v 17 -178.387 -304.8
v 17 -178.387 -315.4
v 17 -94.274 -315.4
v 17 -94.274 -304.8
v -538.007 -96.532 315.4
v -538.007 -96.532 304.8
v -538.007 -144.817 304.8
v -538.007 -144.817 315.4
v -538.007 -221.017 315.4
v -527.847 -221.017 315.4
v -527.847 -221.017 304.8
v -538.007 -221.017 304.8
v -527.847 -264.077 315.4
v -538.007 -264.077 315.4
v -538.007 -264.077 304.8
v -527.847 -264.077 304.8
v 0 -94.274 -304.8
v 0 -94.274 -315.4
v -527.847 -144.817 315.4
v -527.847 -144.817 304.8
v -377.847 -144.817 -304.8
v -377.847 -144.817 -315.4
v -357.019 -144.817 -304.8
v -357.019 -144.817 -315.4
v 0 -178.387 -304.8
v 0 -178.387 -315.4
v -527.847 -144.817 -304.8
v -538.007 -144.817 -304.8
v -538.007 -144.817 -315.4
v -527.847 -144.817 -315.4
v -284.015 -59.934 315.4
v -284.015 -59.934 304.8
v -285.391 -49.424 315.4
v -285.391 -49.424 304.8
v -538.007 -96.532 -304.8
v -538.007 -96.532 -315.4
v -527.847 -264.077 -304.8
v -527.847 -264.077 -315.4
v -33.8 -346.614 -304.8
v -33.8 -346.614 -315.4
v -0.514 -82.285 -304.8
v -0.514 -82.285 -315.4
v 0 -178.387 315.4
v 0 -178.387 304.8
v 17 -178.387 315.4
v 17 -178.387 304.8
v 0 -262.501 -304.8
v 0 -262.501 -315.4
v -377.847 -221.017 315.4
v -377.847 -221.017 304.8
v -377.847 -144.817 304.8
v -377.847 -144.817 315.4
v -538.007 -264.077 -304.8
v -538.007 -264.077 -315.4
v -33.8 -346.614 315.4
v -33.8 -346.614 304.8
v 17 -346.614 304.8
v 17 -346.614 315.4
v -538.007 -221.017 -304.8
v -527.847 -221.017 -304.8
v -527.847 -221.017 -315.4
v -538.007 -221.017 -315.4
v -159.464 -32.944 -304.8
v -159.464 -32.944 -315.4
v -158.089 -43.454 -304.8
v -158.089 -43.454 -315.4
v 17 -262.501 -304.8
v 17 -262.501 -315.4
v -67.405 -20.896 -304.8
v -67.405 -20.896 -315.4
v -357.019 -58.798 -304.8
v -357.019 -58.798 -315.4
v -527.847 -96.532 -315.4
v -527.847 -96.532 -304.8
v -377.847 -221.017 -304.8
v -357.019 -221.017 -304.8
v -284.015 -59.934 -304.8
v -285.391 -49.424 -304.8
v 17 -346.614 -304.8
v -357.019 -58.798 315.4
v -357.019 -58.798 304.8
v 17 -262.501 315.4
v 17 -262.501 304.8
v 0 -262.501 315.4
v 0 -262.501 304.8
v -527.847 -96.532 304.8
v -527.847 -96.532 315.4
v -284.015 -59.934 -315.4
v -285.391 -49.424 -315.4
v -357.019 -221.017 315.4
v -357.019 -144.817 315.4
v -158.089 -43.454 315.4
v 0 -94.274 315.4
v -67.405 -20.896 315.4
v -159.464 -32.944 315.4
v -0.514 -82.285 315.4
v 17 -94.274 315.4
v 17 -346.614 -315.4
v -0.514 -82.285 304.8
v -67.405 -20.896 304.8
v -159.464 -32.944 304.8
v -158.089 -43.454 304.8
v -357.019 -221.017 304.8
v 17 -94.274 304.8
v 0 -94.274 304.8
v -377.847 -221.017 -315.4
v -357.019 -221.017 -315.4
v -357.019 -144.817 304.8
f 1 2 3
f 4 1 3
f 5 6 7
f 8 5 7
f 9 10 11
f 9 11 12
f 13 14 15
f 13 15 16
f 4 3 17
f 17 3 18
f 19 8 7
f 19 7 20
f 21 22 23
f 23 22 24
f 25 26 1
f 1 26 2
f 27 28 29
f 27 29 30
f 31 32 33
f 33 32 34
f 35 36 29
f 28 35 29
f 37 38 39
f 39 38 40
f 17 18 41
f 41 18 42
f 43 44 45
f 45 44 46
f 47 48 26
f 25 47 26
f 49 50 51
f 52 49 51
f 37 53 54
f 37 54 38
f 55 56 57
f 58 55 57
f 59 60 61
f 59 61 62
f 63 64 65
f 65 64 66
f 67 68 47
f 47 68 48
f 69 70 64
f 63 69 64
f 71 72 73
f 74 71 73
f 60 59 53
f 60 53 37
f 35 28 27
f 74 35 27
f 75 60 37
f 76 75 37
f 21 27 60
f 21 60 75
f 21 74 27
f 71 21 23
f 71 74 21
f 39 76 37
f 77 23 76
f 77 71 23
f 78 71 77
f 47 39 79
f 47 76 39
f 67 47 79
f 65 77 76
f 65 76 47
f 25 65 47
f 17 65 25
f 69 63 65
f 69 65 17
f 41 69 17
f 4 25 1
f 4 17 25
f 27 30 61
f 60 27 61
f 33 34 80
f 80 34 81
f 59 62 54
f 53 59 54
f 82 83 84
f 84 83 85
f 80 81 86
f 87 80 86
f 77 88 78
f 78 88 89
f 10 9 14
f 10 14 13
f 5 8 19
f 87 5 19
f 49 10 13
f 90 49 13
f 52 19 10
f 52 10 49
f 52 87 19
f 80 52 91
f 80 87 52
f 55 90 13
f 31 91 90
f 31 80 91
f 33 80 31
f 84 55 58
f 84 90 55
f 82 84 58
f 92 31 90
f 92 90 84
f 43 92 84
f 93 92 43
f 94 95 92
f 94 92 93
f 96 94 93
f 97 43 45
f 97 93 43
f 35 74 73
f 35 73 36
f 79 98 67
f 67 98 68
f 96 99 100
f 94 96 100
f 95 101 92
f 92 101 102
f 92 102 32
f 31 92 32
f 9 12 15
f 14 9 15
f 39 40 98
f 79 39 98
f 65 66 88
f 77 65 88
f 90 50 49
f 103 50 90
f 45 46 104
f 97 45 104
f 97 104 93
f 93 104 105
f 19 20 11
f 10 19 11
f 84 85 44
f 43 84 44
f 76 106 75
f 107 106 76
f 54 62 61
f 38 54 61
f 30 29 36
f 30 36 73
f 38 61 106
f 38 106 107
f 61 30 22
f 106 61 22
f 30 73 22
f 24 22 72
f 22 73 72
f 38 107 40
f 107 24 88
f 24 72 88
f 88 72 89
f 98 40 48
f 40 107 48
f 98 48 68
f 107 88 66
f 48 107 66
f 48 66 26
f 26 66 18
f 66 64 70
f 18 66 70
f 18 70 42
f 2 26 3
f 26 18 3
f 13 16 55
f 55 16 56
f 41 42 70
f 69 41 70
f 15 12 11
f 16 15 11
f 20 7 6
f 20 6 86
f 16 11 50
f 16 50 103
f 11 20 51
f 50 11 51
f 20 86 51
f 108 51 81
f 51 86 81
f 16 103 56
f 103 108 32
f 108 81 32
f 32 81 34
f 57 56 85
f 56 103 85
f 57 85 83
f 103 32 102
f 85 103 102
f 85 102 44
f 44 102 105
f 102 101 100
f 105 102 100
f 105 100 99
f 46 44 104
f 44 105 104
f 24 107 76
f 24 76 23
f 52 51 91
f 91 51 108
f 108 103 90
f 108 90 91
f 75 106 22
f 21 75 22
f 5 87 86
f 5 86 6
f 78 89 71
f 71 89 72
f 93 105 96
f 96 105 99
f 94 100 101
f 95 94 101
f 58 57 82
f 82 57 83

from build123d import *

# Parameters (mm, degrees)
BOSS_EXTRUDE6_START = 304.8
SKETCH1_W           = 20.828
SKETCH1_H           = 76.2
BOSS_EXTRUDE6_DEPTH = 10.6
BOSS_EXTRUDE7_START = -315.4
SKETCH1_6_W         = 20.828
SKETCH1_6_H         = 76.2
BOSS_EXTRUDE7_DEPTH = 10.6


with BuildPart() as part:
    # Sketch1 → Boss-Extrude6 (new body)
    with BuildSketch(Plane.XY.offset(BOSS_EXTRUDE6_START)):
        Polygon((-0.51423671, -82.284564229), (-67.405254048, -20.89578312), (-159.464400403, -32.943769451), (-158.088884295, -43.454143157), (-284.015059826, -59.934383324), (-285.390575935, -49.424009618), (-357.019247807, -58.79821407), (-527.847247807, -96.532420332), (-538.007247807, -96.532420332), (-538.007247807, -144.81700053), (-527.847247807, -144.81700053), (-527.847247807, -221.01700053), (-538.007247807, -221.01700053), (-538.007247807, -264.076781879), (-527.847247807, -264.076781879), (-33.8, -346.614163433), (17, -346.614163433), (17, -262.500622574), (0, -262.500622574), (0, -178.387081716), (17, -178.387081716), (17, -94.273540858), (0, -94.273540858), align=None)
        with Locations((-367.433247807, -182.91700053)):
            Rectangle(SKETCH1_W, SKETCH1_H, mode=Mode.SUBTRACT)
    extrude(amount=BOSS_EXTRUDE6_DEPTH)


with BuildPart() as body_2:
    # Sketch1<6> → Boss-Extrude7 (new body)
    with BuildSketch(Plane.XY.offset(BOSS_EXTRUDE7_START)):
        Polygon((-0.51423671, -82.284564229), (-67.405254048, -20.89578312), (-159.464400403, -32.943769451), (-158.088884295, -43.454143157), (-284.015059826, -59.934383324), (-285.390575935, -49.424009618), (-357.019247807, -58.79821407), (-527.847247807, -96.532420332), (-538.007247807, -96.532420332), (-538.007247807, -144.81700053), (-527.847247807, -144.81700053), (-527.847247807, -221.01700053), (-538.007247807, -221.01700053), (-538.007247807, -264.076781879), (-527.847247807, -264.076781879), (-33.8, -346.614163433), (17, -346.614163433), (17, -262.500622574), (0, -262.500622574), (0, -178.387081716), (17, -178.387081716), (17, -94.273540858), (0, -94.273540858), align=None)
        with Locations((-367.433247807, -182.91700053)):
            Rectangle(SKETCH1_6_W, SKETCH1_6_H, mode=Mode.SUBTRACT)
    extrude(amount=BOSS_EXTRUDE7_DEPTH)


solid = Compound([part.part, body_2.part])
